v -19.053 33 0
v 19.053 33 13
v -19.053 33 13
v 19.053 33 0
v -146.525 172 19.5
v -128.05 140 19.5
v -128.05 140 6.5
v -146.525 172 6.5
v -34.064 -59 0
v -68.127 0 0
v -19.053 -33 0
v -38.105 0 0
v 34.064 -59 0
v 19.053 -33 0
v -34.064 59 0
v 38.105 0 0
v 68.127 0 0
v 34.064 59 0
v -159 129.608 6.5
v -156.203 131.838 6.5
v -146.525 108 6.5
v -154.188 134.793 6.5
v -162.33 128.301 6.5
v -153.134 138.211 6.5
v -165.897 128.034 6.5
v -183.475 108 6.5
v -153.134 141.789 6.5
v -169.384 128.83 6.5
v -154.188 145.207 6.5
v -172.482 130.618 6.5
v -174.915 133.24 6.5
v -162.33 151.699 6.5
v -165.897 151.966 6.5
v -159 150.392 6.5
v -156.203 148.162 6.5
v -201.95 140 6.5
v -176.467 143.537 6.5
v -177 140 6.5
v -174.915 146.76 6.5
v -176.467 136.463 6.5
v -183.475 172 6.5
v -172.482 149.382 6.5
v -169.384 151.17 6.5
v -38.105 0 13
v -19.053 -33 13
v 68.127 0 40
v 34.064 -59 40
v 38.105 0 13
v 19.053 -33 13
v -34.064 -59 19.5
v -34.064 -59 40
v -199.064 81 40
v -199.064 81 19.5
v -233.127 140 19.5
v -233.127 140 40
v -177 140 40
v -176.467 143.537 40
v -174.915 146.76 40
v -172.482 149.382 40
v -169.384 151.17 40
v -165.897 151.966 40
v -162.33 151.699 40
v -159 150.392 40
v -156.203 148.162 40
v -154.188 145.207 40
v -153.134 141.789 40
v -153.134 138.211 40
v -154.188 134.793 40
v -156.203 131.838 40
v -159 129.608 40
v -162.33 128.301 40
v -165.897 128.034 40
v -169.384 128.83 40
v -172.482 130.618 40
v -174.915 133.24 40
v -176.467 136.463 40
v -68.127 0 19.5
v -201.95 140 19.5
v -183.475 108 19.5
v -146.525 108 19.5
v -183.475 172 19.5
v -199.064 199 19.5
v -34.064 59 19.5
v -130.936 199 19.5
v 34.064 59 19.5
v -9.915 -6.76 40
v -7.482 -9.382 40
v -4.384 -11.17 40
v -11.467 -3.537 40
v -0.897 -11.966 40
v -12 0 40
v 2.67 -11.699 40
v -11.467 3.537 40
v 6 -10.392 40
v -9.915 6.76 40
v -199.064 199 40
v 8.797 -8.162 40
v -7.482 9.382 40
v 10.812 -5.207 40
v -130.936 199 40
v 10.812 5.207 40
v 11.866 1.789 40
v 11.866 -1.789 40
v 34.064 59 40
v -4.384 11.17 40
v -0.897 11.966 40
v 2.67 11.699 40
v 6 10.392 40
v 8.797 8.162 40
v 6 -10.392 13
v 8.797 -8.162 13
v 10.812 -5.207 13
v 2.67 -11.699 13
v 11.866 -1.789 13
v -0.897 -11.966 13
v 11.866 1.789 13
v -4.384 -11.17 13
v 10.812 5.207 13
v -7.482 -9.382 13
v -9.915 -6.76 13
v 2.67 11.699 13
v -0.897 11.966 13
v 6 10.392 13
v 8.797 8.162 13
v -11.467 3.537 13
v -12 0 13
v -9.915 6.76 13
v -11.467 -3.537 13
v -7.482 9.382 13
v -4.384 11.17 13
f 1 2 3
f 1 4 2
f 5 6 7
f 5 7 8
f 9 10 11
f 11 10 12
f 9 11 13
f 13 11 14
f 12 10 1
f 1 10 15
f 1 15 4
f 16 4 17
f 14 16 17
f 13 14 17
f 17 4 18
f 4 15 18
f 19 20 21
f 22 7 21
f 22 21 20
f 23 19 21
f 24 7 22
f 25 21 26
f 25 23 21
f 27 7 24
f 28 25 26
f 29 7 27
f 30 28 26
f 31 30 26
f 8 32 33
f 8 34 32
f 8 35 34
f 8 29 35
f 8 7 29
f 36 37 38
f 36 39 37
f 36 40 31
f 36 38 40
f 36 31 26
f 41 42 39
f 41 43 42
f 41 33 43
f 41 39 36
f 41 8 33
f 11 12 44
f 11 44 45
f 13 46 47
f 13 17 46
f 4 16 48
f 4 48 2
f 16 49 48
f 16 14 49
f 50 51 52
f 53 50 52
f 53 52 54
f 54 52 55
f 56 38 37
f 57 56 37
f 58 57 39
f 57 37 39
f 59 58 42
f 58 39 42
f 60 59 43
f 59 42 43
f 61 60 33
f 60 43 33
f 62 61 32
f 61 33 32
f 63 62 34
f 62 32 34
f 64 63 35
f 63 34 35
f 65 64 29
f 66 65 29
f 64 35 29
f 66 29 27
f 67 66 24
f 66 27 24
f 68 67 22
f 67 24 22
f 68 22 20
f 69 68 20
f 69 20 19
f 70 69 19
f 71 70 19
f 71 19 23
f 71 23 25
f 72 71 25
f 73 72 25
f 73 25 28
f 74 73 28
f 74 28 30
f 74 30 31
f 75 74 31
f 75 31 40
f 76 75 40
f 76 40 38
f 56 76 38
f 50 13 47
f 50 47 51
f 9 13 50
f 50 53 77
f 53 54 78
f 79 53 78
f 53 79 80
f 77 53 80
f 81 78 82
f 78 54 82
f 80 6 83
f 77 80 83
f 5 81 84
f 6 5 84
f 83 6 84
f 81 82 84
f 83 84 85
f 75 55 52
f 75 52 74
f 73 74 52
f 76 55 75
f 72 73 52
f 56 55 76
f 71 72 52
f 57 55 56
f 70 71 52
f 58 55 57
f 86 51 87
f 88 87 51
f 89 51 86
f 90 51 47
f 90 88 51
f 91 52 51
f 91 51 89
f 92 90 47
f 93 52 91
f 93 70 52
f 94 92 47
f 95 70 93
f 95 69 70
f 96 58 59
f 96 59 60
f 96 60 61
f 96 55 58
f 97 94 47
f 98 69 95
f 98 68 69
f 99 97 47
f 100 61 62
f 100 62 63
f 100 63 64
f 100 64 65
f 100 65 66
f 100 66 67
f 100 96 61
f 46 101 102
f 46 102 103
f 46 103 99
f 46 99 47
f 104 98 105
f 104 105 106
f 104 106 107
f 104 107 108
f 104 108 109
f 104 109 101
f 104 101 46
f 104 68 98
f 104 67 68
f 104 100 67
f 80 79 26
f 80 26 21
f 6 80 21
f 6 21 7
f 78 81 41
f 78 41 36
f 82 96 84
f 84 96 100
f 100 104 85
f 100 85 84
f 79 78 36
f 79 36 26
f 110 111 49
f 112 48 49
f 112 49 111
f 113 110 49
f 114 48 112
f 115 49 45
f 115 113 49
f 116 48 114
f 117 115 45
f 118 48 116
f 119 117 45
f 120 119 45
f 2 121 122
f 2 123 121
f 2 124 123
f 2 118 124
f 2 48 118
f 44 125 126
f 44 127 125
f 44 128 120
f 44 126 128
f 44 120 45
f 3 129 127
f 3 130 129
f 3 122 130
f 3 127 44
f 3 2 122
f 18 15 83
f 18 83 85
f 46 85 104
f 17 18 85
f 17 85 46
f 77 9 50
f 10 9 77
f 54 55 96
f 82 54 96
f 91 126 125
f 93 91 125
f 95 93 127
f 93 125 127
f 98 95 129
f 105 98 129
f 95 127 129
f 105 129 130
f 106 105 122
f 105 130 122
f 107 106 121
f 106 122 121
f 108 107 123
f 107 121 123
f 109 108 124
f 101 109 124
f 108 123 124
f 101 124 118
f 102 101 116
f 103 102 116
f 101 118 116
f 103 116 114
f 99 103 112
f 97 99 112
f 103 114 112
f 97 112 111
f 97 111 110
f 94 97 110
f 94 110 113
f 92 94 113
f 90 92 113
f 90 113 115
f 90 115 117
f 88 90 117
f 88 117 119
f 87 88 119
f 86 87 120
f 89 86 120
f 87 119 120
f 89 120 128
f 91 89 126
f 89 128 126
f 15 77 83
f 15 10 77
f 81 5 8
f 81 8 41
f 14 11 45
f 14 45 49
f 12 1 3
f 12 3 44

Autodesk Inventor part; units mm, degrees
ref_plane "YZ Plane" through (0, 0, 0) normal (1, 0, 0) x (0, 1, 0)
ref_plane "XZ Plane" through (0, 0, 0) normal (0, 1, 0) x (-1, 0, 0)
ref_plane "XY Plane" through (0, 0, 0) normal (0, 0, 1) x (1, 0, 0)
sketch "Sketch1" plane through (0, 0, 0) normal (0, 0, 1) x (1, 0, 0)
  circle A0 centre (0, 0) radius 12 construction
  line L0 (-68.1273, 0) -> (-34.0637, 59)
  line L1 (-34.0637, 59) -> (34.0637, 59)
  line L2 (34.0637, 59) -> (68.1273, 0)
  line L3 (68.1273, 0) -> (34.0637, -59)
  line L4 (34.0637, -59) -> (-34.0637, -59)
  line L5 (-34.0637, -59) -> (-68.1273, 0)
  dimension "d0" = 24
  dimension "d1" = 118
extrude "Extrusion1" add sketch "Sketch1" along normal blind 40
sketch "Sketch2" plane through (0, 0, 0) normal (0, 0, -1) x (-1, 0, 0)
  line L0 (38.1051, 0) -> (19.0526, -33)
  line L1 (19.0526, -33) -> (-19.0526, -33)
  line L2 (-19.0526, -33) -> (-38.1051, 0)
  line L3 (-38.1051, 0) -> (-19.0526, 33)
  line L4 (-19.0526, 33) -> (19.0526, 33)
  line L5 (19.0526, 33) -> (38.1051, 0)
  circle A0 centre (0, 0) radius 12
  dimension "d4" = 24
  dimension "d5" = 66
extrude "Extrusion2" cut sketch "Sketch2" against normal blind 13 contours L0 L1 L2 L3 L4 L5 | A0
sketch "Sketch3" plane through (0, 0, 40) normal (0, 0, 1) x (1, 0, 0)
  line L0 (-34.0637, -59) -> (34.0637, -59) projected
  line L1 (-34.0637, -59) -> (-199.0637, 81)
  line L2 (34.0637, 59) -> (-34.0637, 59) projected
  line L3 (34.0637, 59) -> (-130.9363, 199)
  line L4 (-68.1273, 0) -> (-34.0637, -59) projected
  line L5 (-34.0637, 59) -> (-68.1273, 0) projected
  line L6 (-130.9363, 199) -> (-96.8727, 140)
  line L7 (-96.8727, 140) -> (-130.9363, 81)
  line L8 (-130.9363, 81) -> (-199.0637, 81)
  line L9 (-199.0637, 81) -> (-233.1273, 140)
  line L10 (-233.1273, 140) -> (-199.0637, 199)
  line L11 (-199.0637, 199) -> (-130.9363, 199)
  point P0 (0, 0)
  point P1 (-165, 140)
  dimension "d9" = 165
  dimension "d21" = 140
  dimension "d22" = 118
extrude "Extrusion3" add sketch "Sketch3" against normal blind 20.5
sketch "Sketch4" plane through (0, 0, 13) normal (0, 0, -1) x (-1, 0, 0)
  circle A0 centre (0, 0) radius 12
  dimension "d12" = 24
extrude "Extrusion4" cut sketch "Sketch4" against normal through all
sketch "Sketch5" plane through (0, 0, 19.5) normal (0, 0, -1) x (-1, 0, 0)
  line L0 (199.0637, 199) -> (130.9363, 199) projected
  line L1 (201.9504, 140) -> (183.4752, 108)
  line L2 (183.4752, 108) -> (146.5248, 108)
  line L3 (146.5248, 108) -> (128.0496, 140)
  line L4 (128.0496, 140) -> (146.5248, 172)
  line L5 (146.5248, 172) -> (183.4752, 172)
  line L6 (183.4752, 172) -> (201.9504, 140)
  point P0 (0, 0)
  point P1 (165, 140)
  point P2 (165, 199)
  point P3 (233.1273, 140)
  dimension "d15" = 64
extrude "Extrusion5" add sketch "Sketch5" along normal blind 13
sketch "Sketch6" plane through (0, 0, 6.5) normal (0, 0, -1) x (-1, 0, 0)
  circle A0 centre (165, 140) radius 12
  line L0 (183.4752, 172) -> (146.5248, 172) projected
  point P0 (0, 0)
  point P1 (201.9504, 140)
  point P2 (165, 172)
  dimension "d18" = 24
extrude "Extrusion6" cut sketch "Sketch6" against normal through all
properties part number "HA10" material "ABS Plastic"
